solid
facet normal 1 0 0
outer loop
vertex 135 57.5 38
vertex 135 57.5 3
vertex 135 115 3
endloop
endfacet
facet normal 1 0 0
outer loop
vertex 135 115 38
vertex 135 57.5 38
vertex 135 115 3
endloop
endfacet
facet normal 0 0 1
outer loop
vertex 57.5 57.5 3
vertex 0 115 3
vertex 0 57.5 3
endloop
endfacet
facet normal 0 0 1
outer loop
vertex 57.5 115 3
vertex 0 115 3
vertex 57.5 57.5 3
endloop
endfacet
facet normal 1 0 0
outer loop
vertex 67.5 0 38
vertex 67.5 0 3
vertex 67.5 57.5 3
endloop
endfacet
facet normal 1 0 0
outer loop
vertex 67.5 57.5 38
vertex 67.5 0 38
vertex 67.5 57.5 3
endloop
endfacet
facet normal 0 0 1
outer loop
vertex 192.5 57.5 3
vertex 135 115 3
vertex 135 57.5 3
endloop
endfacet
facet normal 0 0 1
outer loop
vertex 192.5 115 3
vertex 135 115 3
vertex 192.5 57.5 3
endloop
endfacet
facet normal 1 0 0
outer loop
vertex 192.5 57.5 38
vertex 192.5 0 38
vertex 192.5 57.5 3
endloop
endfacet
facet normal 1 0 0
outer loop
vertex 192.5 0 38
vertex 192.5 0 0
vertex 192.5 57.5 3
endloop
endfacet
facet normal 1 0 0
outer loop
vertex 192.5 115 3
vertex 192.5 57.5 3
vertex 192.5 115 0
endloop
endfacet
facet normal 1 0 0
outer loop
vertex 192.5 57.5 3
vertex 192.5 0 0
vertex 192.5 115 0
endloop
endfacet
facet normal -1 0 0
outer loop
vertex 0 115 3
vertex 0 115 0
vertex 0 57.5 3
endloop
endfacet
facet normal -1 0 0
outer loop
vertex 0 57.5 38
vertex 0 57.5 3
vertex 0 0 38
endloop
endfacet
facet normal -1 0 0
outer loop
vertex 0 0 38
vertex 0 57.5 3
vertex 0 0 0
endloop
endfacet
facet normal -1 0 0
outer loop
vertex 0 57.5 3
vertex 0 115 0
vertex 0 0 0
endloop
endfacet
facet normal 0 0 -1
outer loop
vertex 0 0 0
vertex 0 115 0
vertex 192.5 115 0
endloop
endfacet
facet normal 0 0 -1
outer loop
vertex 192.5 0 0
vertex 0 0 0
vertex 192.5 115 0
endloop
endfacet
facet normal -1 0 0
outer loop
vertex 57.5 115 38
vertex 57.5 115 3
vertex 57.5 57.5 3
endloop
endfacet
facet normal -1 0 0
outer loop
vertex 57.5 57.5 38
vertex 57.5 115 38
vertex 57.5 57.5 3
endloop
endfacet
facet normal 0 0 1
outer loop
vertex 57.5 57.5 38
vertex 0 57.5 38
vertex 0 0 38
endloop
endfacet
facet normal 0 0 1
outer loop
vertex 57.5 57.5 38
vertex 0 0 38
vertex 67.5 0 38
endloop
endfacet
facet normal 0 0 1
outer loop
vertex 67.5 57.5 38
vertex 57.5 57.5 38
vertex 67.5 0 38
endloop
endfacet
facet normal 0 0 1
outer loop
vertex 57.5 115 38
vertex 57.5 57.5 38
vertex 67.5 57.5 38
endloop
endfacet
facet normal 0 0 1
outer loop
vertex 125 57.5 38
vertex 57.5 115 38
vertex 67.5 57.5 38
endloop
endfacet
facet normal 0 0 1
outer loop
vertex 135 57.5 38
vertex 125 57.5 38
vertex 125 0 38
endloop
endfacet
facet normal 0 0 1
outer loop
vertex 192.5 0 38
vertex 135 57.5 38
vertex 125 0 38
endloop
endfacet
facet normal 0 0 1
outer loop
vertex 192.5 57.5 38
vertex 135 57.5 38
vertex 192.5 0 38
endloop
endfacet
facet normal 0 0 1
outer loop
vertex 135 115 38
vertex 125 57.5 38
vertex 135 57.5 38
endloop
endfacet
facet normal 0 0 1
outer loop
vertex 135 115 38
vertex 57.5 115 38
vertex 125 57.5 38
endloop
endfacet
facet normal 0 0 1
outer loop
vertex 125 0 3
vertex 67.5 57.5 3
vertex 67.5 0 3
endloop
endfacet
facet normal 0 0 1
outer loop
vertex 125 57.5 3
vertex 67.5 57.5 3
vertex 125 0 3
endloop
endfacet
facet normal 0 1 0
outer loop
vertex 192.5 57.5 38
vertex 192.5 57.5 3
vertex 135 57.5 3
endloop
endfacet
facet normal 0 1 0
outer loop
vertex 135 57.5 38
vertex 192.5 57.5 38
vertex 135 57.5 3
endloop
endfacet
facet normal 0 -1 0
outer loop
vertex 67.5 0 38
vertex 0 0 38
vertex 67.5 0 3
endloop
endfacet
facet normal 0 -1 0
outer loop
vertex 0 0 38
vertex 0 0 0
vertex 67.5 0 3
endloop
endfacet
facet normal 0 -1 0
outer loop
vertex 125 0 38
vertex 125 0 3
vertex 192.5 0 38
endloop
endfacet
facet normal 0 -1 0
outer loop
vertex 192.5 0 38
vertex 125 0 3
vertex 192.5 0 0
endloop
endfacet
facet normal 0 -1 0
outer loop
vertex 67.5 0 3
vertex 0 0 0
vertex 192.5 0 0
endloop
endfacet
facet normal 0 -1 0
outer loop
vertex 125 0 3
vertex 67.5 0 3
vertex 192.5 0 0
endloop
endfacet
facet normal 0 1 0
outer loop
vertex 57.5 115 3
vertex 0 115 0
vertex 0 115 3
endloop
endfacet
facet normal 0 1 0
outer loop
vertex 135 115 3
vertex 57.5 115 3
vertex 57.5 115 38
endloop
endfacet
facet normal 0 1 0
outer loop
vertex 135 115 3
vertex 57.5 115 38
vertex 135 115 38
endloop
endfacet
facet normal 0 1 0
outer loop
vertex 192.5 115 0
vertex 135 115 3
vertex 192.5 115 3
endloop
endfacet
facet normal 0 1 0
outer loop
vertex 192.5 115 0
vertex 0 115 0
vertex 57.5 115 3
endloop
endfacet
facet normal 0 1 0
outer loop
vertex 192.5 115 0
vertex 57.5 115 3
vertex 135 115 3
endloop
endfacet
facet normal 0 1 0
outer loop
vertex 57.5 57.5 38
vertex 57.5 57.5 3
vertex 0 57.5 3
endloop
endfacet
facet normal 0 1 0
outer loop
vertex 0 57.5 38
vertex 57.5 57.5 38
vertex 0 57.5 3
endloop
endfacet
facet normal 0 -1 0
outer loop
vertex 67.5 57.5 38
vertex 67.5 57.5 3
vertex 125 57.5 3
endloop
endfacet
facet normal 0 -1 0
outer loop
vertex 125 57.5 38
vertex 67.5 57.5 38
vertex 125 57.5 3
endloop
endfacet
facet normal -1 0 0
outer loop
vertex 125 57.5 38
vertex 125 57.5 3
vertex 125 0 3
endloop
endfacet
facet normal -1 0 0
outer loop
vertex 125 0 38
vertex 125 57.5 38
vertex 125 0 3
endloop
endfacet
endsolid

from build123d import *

# Parameters (mm, degrees)
SKETCH1_W           = 192.5
SKETCH1_H           = 115
BOSS_EXTRUDE1_DEPTH = 3
BOSS_EXTRUDE2_DEPTH = 35


with BuildPart() as part:
    # Sketch1 → Boss-Extrude1 (new body)
    with BuildSketch(Plane.XY):
        with Locations((96.25, 57.5)):
            Rectangle(SKETCH1_W, SKETCH1_H)
    extrude(amount=BOSS_EXTRUDE1_DEPTH)

    # Sketch2 → Boss-Extrude2 (add)
    with BuildSketch(Plane.XY.offset(3)):
        Polygon((0, 57.5), (0, 0), (67.5, 0), (67.5, 57.5), (125, 57.5), (125, 0), (192.5, 0), (192.5, 57.5), (135, 57.5), (135, 115), (57.5, 115), (57.5, 57.5), align=None)
    extrude(amount=BOSS_EXTRUDE2_DEPTH)


solid = part.part
